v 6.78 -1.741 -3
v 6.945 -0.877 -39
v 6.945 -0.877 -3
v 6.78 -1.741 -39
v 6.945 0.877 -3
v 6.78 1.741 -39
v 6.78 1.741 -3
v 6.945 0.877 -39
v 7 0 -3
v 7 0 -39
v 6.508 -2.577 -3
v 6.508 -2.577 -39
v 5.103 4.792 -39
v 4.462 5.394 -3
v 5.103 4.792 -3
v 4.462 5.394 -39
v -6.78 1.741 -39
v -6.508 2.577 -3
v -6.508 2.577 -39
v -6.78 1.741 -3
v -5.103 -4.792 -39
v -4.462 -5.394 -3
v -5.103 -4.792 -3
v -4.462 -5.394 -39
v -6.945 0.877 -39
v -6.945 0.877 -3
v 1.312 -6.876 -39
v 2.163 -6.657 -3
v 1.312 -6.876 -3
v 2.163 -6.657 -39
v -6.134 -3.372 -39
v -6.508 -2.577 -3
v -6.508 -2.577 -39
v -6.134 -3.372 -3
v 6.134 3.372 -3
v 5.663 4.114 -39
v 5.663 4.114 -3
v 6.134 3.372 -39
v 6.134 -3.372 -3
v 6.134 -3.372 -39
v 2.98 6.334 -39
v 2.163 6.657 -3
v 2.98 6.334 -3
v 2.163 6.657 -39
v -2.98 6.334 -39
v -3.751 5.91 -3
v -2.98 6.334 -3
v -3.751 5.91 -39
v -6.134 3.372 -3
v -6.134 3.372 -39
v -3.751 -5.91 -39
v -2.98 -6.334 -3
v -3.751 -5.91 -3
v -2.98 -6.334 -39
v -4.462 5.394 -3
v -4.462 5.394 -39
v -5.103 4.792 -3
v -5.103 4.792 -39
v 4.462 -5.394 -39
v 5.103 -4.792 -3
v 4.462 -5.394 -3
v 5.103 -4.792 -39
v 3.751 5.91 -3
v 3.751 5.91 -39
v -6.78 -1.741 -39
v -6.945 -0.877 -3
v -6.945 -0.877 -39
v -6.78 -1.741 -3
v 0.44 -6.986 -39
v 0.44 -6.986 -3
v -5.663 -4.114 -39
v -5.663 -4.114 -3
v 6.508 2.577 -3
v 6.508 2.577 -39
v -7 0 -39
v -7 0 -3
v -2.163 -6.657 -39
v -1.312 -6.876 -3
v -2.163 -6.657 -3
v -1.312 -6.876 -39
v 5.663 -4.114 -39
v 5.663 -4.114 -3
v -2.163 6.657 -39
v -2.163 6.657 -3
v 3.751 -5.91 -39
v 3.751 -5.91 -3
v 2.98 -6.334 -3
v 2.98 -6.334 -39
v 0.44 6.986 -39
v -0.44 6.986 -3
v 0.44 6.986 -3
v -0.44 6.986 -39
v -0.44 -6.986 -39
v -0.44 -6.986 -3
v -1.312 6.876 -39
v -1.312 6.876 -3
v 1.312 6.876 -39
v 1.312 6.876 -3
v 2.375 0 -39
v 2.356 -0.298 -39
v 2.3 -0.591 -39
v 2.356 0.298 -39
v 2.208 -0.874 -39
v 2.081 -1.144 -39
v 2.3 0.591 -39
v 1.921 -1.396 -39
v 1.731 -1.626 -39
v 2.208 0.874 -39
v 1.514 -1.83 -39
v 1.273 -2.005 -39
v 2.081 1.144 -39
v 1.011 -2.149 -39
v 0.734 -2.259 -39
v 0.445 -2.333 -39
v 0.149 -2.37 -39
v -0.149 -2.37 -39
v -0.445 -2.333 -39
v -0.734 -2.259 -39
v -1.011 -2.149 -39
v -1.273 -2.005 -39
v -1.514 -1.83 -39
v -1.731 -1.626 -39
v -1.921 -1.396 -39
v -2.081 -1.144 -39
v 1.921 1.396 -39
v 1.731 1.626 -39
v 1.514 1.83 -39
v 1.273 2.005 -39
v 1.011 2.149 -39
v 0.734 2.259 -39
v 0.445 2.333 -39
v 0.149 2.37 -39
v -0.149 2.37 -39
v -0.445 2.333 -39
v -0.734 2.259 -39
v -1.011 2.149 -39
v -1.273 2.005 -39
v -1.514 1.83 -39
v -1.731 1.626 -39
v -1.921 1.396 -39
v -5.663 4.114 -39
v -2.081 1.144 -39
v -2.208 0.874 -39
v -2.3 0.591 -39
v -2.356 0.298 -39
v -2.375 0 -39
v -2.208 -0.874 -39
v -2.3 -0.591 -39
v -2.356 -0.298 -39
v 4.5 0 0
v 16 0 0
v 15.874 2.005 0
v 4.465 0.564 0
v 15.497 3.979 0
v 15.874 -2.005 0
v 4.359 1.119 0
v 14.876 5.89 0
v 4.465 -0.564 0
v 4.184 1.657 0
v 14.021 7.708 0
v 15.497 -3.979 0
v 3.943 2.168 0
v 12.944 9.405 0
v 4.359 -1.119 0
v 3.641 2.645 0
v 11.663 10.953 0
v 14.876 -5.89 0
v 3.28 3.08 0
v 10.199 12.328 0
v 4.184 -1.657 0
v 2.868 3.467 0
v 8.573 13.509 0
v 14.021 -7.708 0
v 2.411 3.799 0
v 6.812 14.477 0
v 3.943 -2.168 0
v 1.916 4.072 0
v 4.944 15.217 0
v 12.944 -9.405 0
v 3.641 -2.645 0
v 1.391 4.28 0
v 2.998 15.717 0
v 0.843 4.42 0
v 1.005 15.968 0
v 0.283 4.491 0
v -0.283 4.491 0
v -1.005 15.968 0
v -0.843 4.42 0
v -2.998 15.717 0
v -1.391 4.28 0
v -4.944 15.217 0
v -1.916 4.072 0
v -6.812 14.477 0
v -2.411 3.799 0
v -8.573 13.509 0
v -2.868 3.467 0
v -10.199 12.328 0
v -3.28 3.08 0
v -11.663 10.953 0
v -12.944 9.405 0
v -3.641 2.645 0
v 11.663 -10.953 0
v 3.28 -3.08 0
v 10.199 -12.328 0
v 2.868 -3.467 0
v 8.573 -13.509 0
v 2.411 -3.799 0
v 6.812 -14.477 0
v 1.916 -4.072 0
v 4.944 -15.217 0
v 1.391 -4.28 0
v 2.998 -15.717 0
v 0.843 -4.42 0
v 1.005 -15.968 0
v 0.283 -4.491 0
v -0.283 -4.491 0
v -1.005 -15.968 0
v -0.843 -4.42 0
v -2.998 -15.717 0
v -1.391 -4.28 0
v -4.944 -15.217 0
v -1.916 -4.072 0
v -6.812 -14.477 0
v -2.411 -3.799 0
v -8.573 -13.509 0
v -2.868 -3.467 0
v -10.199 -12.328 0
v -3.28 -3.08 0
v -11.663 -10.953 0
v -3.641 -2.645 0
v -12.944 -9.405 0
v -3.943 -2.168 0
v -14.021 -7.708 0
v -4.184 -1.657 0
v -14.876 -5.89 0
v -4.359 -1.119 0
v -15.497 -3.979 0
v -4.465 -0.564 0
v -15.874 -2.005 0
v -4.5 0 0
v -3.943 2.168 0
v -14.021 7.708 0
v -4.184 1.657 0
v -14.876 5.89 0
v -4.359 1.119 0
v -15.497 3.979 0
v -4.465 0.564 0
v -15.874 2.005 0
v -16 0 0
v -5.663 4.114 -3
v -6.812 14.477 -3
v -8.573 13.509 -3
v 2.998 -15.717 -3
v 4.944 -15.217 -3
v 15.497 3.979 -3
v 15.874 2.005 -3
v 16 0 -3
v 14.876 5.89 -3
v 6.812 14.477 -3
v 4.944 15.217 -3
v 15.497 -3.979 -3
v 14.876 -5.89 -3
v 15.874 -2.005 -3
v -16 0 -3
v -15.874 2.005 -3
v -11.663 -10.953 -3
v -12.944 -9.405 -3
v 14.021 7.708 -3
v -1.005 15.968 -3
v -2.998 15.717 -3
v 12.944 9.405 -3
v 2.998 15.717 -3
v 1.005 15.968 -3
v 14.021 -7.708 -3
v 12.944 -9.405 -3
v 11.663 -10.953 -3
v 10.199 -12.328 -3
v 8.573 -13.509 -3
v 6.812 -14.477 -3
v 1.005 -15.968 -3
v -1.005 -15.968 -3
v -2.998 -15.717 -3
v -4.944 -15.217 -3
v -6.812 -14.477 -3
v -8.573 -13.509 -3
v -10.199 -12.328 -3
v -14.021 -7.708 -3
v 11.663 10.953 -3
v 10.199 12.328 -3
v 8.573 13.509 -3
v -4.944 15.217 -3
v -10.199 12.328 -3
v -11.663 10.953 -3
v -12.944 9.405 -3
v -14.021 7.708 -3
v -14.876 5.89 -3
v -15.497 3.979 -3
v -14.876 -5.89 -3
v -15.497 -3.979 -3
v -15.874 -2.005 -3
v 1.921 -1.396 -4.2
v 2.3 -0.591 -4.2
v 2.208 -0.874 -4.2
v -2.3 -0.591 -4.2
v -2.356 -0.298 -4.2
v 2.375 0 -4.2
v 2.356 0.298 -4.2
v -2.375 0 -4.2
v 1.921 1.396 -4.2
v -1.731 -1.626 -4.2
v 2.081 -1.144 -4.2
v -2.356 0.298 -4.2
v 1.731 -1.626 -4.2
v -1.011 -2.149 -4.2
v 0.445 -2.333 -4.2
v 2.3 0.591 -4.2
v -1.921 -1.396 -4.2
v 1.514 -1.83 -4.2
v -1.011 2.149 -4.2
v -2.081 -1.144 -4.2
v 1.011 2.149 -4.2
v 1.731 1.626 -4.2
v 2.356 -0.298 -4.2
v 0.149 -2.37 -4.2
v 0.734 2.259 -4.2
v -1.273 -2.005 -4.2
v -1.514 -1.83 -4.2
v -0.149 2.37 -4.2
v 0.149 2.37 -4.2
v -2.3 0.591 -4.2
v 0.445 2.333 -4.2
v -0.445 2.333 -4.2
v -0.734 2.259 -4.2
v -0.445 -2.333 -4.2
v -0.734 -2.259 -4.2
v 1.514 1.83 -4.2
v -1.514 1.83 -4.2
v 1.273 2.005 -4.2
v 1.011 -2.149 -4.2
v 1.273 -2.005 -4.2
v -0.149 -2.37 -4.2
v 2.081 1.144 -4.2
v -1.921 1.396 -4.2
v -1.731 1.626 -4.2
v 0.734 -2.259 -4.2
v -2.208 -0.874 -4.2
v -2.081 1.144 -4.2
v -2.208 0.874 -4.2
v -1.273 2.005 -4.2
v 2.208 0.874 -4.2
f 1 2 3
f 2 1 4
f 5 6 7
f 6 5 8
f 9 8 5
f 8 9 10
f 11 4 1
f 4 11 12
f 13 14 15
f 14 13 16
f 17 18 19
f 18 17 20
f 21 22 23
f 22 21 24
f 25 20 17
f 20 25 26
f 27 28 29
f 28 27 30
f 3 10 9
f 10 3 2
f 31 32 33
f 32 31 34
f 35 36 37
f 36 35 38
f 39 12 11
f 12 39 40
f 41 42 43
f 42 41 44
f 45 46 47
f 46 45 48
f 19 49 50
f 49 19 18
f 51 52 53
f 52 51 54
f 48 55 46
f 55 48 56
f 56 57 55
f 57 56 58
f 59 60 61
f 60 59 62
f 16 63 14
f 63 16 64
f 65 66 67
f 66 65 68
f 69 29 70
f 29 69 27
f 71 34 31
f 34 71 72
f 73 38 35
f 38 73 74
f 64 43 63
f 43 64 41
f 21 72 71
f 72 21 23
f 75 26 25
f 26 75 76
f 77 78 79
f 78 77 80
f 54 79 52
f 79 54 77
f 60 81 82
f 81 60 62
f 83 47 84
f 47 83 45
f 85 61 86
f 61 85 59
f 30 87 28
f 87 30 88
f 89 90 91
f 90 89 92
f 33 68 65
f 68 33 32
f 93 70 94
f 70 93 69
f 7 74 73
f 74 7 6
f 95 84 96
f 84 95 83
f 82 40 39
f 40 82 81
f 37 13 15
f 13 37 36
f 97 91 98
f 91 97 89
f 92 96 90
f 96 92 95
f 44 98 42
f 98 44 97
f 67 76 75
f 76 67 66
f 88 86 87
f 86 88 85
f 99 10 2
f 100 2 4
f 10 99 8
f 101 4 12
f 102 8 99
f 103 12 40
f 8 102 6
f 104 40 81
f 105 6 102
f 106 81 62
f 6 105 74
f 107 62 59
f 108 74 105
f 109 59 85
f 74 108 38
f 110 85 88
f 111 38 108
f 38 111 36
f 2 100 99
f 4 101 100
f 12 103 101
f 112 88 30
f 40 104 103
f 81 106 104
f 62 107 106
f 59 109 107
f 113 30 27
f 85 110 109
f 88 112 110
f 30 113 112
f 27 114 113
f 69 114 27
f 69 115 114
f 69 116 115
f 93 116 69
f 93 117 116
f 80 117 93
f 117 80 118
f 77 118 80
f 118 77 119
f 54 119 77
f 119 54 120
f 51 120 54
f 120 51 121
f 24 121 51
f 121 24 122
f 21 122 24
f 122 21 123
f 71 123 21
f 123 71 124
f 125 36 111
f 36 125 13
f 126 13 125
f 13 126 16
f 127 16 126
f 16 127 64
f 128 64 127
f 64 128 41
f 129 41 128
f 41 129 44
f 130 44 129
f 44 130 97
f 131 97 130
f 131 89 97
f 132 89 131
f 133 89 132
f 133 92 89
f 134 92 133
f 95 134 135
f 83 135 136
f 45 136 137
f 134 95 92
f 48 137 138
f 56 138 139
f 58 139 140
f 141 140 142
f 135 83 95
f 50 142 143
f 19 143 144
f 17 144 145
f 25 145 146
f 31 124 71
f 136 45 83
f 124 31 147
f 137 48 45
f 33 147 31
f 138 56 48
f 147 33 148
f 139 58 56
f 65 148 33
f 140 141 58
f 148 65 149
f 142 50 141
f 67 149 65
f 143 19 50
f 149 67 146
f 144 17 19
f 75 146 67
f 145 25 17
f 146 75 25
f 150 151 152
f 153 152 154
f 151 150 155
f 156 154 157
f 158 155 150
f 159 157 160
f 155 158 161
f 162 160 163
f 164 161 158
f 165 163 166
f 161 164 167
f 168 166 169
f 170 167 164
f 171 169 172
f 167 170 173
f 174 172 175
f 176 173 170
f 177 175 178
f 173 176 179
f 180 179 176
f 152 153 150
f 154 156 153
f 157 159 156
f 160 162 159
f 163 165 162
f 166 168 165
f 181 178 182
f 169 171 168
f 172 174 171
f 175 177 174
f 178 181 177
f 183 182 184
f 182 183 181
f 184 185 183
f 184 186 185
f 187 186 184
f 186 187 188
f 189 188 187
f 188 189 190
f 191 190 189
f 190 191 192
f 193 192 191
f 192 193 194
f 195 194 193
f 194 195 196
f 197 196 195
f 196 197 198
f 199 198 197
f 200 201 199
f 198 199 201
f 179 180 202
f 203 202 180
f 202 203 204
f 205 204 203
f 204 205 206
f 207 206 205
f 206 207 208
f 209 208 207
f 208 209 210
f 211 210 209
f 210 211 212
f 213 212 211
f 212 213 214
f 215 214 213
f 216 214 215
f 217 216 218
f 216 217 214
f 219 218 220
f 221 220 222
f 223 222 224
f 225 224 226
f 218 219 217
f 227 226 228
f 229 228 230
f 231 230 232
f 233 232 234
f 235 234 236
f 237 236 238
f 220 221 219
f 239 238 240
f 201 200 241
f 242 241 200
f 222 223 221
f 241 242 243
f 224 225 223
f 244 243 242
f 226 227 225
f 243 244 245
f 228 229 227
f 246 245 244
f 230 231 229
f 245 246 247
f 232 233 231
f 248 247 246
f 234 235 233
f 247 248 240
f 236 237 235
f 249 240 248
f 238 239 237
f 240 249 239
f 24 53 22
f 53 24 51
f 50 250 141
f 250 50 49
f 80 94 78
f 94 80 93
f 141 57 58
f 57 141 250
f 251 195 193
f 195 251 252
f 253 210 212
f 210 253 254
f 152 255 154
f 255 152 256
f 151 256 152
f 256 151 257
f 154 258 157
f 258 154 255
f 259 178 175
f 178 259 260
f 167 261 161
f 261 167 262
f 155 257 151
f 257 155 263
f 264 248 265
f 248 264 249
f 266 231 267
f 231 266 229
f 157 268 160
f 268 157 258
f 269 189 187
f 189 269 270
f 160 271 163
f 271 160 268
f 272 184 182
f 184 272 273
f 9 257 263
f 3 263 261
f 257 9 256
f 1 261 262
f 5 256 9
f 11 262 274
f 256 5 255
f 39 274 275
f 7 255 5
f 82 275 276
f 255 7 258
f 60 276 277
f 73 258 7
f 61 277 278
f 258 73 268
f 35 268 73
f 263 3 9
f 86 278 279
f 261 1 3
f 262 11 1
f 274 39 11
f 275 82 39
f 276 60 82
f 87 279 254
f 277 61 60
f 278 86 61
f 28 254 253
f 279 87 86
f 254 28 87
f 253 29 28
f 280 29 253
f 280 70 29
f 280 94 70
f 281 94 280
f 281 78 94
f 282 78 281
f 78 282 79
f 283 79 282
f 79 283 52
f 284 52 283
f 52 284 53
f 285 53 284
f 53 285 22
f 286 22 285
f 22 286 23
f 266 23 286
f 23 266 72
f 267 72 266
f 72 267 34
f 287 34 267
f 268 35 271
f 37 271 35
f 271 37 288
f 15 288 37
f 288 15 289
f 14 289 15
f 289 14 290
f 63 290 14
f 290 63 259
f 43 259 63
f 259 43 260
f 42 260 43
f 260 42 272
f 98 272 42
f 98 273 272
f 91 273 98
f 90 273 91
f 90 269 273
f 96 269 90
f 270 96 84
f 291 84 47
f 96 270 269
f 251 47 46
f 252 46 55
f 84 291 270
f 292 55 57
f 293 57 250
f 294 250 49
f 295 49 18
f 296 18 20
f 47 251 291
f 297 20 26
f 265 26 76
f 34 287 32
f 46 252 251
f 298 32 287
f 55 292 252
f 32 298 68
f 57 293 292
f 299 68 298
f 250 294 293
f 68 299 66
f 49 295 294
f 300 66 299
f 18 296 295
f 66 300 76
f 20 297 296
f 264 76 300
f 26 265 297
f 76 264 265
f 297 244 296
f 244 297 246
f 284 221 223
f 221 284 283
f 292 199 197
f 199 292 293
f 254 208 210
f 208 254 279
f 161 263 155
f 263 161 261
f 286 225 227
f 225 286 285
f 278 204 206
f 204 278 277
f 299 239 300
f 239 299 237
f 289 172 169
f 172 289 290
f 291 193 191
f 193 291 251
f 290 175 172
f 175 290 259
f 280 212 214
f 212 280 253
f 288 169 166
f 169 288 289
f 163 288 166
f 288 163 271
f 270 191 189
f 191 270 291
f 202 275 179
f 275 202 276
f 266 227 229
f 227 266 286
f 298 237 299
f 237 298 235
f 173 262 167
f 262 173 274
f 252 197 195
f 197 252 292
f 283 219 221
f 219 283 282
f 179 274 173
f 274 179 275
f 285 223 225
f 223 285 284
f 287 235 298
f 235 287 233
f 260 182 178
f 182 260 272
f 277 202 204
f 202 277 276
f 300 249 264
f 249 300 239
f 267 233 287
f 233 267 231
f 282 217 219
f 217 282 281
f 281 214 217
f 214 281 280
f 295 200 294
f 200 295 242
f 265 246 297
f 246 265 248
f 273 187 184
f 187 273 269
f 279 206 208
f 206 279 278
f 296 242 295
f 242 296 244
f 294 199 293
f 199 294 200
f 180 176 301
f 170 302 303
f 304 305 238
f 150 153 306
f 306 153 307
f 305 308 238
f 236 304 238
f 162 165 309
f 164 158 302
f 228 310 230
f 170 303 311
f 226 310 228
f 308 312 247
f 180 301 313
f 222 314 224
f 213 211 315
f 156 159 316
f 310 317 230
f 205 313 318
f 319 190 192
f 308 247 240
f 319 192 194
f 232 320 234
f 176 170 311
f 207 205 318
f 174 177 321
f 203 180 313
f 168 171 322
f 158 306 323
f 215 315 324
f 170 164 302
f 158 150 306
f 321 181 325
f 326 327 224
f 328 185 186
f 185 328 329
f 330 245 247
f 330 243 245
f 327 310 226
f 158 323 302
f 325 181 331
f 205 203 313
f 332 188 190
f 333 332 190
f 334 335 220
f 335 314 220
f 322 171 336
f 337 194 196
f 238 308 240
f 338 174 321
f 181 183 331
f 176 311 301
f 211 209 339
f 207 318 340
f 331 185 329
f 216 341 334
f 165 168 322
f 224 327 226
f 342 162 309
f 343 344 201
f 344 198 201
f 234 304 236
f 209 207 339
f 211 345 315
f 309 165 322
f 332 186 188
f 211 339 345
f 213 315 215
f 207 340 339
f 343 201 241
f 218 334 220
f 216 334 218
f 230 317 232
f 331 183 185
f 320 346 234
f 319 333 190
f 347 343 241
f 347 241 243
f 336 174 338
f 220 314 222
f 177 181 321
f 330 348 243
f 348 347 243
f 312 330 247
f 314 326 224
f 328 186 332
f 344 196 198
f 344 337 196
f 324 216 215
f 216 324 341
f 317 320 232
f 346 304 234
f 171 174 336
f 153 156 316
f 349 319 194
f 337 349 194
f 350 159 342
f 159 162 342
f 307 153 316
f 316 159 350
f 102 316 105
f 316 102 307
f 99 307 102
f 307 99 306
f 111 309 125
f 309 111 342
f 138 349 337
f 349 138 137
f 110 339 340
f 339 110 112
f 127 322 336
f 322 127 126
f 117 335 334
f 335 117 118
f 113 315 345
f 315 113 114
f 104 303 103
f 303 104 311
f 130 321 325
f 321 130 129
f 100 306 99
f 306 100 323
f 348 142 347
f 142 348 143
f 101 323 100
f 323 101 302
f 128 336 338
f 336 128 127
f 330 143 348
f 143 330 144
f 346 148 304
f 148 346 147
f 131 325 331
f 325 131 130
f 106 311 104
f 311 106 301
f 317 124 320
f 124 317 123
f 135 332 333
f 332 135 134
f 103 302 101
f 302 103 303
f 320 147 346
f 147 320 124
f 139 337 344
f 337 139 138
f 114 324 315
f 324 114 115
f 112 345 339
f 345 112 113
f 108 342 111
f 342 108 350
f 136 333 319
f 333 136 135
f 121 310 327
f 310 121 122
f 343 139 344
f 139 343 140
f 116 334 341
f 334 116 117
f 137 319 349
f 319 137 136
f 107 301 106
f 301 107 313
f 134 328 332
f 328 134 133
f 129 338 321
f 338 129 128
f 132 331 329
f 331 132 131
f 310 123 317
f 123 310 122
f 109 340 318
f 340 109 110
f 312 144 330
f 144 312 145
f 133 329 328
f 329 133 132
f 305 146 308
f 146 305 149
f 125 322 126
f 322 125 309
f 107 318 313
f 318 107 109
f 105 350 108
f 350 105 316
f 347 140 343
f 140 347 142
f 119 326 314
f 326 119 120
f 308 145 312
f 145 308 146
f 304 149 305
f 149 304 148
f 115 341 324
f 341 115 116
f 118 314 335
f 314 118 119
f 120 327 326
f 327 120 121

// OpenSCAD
$fn = 50;


difference() {
	union() {
		translate(v = [0, 0, -39.0000000000]) {
			cylinder(h = 39, r = 7.0000000000);
		}
		translate(v = [0, 0, -3.0000000000]) {
			cylinder(h = 3, r = 16.0000000000);
		}
	}
	union() {
		translate(v = [0, 0, 0]) {
			rotate(a = [0, 0, 0]) {
				difference() {
					union() {
						#translate(v = [0, 0, -39.0000000000]) {
							cylinder(h = 39, r = 2.2500000000);
						}
						#translate(v = [0, 0, -4.2000000000]) {
							cylinder(h = 4.2000000000, r1 = 2.3750000000, r2 = 4.5000000000);
						}
						#translate(v = [0, 0, -39.0000000000]) {
							cylinder(h = 39, r = 2.3750000000);
						}
						#translate(v = [0, 0, -39.0000000000]) {
							cylinder(h = 39, r = 2.2500000000);
						}
					}
					union();
				}
			}
		}
	}
}
